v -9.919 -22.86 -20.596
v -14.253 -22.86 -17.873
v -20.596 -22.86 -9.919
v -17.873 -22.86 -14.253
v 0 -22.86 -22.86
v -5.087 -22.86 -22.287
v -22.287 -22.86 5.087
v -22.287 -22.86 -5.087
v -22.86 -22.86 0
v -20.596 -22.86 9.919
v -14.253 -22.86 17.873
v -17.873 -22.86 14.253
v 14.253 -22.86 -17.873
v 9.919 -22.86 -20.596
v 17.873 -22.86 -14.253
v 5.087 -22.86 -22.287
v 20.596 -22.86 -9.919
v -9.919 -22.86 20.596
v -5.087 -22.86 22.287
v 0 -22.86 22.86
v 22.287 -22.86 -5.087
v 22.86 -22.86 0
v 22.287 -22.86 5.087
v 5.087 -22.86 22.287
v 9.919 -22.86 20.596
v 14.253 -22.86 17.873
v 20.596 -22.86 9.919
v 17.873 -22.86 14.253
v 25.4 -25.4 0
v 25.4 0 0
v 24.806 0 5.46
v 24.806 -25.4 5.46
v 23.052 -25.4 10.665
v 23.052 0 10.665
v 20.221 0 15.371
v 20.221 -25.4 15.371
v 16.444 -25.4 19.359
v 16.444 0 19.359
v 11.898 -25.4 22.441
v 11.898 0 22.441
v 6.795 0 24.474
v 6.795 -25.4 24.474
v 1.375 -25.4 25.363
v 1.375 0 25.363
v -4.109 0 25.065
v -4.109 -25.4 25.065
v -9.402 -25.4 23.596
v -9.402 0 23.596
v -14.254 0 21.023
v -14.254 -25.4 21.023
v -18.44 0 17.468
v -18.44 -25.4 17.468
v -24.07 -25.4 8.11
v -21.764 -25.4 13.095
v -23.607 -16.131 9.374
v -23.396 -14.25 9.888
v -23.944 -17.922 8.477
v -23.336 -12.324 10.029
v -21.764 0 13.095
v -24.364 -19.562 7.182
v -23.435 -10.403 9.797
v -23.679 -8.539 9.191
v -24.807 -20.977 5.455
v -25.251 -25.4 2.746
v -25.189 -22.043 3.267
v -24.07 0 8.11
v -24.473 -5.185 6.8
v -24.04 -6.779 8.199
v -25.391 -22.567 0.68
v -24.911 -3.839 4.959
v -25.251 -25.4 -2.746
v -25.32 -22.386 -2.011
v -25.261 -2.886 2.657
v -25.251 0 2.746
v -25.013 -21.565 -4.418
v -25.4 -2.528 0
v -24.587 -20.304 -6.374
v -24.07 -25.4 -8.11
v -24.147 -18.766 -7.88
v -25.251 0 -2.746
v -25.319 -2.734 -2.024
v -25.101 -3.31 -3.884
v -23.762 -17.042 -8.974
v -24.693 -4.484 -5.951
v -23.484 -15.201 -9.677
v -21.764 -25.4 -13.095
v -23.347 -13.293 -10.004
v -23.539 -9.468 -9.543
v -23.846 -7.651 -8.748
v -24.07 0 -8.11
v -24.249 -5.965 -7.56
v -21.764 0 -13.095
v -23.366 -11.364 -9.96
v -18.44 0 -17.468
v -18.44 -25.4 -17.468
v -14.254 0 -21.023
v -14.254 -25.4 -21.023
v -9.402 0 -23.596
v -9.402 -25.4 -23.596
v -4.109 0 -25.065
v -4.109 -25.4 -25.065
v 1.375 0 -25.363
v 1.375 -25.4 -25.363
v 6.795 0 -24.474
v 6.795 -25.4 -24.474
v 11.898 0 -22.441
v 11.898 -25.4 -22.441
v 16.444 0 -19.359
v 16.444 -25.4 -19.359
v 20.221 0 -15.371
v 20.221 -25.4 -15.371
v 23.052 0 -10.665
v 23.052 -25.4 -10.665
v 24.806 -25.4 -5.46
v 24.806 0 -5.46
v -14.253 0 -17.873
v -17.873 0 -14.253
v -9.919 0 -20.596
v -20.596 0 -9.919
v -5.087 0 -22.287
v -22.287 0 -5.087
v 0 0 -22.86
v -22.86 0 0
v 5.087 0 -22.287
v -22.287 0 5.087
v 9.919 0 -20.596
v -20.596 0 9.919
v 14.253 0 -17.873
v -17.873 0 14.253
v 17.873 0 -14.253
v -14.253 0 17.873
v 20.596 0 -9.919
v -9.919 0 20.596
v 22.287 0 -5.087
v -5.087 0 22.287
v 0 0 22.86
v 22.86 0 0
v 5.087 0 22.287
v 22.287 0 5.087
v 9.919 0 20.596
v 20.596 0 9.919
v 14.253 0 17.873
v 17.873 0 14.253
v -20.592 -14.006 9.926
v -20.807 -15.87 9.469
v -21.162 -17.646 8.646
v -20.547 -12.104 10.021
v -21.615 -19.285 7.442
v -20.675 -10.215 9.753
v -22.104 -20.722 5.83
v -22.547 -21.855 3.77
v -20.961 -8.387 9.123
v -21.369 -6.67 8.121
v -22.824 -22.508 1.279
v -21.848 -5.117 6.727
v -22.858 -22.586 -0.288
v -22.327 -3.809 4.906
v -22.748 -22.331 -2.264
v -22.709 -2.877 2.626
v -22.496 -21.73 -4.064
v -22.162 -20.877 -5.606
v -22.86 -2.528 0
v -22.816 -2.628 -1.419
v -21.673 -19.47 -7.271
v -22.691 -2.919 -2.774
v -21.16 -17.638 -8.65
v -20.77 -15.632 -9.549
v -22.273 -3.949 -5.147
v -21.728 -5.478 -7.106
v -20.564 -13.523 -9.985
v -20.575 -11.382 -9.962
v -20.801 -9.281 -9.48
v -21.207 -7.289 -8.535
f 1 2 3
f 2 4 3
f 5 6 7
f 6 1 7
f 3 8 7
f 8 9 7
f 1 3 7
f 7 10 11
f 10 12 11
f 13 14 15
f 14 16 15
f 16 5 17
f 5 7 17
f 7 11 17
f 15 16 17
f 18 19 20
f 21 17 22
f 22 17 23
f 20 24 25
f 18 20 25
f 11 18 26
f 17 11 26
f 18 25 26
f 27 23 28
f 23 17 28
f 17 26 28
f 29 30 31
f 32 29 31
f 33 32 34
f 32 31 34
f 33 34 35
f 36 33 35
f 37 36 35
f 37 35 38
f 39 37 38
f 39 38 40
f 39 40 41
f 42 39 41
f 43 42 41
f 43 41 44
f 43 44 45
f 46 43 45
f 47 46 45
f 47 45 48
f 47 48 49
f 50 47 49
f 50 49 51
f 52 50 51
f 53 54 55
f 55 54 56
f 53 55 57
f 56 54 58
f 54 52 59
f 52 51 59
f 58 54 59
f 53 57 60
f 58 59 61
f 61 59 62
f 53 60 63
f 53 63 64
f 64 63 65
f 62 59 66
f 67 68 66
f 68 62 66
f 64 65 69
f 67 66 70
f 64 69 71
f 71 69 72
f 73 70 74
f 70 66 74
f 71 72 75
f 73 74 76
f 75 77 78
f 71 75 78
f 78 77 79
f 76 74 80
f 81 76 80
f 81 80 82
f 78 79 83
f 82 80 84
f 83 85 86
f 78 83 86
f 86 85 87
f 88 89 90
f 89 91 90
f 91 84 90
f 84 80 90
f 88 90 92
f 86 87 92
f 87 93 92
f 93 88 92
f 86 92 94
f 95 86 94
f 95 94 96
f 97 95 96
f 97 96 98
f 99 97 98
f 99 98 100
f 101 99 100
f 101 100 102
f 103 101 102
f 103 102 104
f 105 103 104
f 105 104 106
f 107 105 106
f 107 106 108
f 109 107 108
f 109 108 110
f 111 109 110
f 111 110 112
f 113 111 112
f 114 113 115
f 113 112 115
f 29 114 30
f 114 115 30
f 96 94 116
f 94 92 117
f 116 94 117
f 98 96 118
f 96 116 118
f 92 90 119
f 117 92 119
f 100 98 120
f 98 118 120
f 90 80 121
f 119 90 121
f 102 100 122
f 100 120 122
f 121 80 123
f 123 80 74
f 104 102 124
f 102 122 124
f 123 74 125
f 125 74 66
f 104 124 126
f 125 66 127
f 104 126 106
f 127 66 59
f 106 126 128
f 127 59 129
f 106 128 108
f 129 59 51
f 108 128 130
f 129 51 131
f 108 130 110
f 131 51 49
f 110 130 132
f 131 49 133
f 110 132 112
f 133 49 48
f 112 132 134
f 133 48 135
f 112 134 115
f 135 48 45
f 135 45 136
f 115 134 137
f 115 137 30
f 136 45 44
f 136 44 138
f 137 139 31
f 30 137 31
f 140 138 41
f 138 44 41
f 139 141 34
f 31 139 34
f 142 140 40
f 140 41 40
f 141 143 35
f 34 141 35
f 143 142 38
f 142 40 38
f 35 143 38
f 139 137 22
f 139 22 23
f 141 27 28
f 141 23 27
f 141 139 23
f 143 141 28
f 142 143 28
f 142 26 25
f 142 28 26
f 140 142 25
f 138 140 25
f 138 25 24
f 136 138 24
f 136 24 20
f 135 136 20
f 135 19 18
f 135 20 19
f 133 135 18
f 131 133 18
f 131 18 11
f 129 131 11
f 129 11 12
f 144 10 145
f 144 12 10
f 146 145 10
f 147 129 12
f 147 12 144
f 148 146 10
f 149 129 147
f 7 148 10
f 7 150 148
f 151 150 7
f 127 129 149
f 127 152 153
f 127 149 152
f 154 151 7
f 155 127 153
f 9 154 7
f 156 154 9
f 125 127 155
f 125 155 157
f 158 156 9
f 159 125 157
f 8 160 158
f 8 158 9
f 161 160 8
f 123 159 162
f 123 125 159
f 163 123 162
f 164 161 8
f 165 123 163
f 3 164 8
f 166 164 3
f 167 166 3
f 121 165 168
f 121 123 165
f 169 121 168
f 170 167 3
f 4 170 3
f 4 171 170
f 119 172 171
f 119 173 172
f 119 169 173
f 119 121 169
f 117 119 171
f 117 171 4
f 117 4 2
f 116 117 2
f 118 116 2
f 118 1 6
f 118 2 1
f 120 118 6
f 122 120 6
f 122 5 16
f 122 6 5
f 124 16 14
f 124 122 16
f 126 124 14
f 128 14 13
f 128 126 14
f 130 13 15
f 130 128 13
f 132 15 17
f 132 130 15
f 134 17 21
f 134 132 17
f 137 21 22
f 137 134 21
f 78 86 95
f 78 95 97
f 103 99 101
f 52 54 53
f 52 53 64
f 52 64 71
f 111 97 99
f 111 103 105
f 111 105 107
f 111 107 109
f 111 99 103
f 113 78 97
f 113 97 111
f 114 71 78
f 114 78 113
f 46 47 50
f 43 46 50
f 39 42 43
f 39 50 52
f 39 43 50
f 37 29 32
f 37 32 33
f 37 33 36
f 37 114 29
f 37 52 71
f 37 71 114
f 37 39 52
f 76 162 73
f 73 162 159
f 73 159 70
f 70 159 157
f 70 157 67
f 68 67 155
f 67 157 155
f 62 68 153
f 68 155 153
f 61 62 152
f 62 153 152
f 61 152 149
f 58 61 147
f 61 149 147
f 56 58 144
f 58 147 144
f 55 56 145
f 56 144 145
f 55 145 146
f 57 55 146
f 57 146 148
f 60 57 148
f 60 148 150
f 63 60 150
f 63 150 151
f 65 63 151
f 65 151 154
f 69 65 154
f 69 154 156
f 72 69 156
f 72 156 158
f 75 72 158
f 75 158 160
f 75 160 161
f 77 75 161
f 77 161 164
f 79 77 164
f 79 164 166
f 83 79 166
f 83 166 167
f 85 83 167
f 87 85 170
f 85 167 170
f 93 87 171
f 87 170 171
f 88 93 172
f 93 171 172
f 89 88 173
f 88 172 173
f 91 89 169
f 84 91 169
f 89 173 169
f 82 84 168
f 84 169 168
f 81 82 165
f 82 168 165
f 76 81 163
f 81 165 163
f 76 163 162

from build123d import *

# Parameters (mm, degrees)
F0_R     = 25.4
F1_DEPTH = 25.4
F2_T     = -2.54
F3_R     = 10.031251
F4_DEPTH = 25.401


with BuildPart() as f1:
    # F0 (on Front) → F1 (new body)
    with BuildSketch(Plane.XZ):
        Circle(F0_R)
    extrude(amount=F1_DEPTH)

    # F2
    f2_openings = [f1.faces().sort_by_distance(p)[0] for p in [
        (0, 0, 0),
    ]]
    offset(amount=F2_T, openings=f2_openings)

    # F3 (on Right) → F4 (cut, through all)
    with BuildSketch(Plane.YZ):
        with Locations((-12.55889, 0)):
            Circle(F3_R)
    extrude(amount=-F4_DEPTH, mode=Mode.SUBTRACT)


solid = f1.part
